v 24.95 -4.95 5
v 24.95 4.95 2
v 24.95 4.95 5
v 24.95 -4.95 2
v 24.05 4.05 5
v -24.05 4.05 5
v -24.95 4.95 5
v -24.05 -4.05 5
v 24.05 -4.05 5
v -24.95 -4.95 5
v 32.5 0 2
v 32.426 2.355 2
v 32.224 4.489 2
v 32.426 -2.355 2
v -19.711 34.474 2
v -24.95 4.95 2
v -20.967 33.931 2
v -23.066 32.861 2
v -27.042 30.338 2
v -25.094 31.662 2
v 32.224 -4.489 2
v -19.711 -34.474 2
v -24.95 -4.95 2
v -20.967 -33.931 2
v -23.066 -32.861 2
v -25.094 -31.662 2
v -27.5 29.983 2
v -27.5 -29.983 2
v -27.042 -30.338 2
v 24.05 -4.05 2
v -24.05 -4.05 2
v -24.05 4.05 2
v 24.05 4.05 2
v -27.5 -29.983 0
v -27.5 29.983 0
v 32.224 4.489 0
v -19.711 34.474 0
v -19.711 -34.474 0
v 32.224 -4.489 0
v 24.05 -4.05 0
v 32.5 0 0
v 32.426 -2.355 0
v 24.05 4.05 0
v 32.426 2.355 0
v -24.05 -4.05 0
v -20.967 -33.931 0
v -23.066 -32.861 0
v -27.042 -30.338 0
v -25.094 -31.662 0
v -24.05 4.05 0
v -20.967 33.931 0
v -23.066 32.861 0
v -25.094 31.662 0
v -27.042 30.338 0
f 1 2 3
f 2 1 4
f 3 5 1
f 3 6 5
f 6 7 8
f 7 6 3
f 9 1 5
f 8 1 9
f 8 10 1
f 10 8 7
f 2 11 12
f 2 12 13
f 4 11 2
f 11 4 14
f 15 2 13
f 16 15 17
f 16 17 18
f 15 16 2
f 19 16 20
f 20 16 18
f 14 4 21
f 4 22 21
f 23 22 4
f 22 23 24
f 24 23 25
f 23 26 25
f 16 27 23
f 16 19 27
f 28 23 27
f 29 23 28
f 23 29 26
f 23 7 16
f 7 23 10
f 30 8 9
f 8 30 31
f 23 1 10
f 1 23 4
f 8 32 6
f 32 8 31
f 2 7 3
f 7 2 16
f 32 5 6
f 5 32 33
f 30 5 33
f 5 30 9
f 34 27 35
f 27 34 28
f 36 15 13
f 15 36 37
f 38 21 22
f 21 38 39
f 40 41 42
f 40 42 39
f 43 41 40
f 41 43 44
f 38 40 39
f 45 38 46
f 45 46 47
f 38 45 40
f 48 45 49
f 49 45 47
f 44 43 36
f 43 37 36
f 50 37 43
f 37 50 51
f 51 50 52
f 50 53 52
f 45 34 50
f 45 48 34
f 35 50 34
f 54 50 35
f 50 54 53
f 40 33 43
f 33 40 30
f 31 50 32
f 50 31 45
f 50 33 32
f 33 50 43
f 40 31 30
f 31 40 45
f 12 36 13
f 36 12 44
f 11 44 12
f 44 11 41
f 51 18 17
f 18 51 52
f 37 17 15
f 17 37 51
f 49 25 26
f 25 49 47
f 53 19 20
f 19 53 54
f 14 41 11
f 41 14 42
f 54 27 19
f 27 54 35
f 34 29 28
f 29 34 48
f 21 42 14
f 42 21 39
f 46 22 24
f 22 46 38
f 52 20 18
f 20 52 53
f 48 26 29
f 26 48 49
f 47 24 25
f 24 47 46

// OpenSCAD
translate([- 49.9 / 2, - 9.9 / 2, 2])
union(){
    cube([49.9, 0.9, 3]);
    cube([0.9, 9.9, 3]);
    translate([0, 9, 0])
    cube([49.9, 0.9, 3]);
    translate([49, 0, 0])
    cube([0.9, 9.9, 3]);
}

translate([-5, 0, 0])
intersection(){   
    difference(){
        cylinder(h = 2, d = 90, $fn=3, center = false);
        translate([- 49.9 / 2 + 0.9 + 5, - 9.9 / 2 + 0.9, 0])
        cube([49.9 - 2 * 0.9, 9.9 - 2 * 0.9, 2], false);
    }
    cylinder(h = 2, d = 75, $fn=100, center = false);
}
